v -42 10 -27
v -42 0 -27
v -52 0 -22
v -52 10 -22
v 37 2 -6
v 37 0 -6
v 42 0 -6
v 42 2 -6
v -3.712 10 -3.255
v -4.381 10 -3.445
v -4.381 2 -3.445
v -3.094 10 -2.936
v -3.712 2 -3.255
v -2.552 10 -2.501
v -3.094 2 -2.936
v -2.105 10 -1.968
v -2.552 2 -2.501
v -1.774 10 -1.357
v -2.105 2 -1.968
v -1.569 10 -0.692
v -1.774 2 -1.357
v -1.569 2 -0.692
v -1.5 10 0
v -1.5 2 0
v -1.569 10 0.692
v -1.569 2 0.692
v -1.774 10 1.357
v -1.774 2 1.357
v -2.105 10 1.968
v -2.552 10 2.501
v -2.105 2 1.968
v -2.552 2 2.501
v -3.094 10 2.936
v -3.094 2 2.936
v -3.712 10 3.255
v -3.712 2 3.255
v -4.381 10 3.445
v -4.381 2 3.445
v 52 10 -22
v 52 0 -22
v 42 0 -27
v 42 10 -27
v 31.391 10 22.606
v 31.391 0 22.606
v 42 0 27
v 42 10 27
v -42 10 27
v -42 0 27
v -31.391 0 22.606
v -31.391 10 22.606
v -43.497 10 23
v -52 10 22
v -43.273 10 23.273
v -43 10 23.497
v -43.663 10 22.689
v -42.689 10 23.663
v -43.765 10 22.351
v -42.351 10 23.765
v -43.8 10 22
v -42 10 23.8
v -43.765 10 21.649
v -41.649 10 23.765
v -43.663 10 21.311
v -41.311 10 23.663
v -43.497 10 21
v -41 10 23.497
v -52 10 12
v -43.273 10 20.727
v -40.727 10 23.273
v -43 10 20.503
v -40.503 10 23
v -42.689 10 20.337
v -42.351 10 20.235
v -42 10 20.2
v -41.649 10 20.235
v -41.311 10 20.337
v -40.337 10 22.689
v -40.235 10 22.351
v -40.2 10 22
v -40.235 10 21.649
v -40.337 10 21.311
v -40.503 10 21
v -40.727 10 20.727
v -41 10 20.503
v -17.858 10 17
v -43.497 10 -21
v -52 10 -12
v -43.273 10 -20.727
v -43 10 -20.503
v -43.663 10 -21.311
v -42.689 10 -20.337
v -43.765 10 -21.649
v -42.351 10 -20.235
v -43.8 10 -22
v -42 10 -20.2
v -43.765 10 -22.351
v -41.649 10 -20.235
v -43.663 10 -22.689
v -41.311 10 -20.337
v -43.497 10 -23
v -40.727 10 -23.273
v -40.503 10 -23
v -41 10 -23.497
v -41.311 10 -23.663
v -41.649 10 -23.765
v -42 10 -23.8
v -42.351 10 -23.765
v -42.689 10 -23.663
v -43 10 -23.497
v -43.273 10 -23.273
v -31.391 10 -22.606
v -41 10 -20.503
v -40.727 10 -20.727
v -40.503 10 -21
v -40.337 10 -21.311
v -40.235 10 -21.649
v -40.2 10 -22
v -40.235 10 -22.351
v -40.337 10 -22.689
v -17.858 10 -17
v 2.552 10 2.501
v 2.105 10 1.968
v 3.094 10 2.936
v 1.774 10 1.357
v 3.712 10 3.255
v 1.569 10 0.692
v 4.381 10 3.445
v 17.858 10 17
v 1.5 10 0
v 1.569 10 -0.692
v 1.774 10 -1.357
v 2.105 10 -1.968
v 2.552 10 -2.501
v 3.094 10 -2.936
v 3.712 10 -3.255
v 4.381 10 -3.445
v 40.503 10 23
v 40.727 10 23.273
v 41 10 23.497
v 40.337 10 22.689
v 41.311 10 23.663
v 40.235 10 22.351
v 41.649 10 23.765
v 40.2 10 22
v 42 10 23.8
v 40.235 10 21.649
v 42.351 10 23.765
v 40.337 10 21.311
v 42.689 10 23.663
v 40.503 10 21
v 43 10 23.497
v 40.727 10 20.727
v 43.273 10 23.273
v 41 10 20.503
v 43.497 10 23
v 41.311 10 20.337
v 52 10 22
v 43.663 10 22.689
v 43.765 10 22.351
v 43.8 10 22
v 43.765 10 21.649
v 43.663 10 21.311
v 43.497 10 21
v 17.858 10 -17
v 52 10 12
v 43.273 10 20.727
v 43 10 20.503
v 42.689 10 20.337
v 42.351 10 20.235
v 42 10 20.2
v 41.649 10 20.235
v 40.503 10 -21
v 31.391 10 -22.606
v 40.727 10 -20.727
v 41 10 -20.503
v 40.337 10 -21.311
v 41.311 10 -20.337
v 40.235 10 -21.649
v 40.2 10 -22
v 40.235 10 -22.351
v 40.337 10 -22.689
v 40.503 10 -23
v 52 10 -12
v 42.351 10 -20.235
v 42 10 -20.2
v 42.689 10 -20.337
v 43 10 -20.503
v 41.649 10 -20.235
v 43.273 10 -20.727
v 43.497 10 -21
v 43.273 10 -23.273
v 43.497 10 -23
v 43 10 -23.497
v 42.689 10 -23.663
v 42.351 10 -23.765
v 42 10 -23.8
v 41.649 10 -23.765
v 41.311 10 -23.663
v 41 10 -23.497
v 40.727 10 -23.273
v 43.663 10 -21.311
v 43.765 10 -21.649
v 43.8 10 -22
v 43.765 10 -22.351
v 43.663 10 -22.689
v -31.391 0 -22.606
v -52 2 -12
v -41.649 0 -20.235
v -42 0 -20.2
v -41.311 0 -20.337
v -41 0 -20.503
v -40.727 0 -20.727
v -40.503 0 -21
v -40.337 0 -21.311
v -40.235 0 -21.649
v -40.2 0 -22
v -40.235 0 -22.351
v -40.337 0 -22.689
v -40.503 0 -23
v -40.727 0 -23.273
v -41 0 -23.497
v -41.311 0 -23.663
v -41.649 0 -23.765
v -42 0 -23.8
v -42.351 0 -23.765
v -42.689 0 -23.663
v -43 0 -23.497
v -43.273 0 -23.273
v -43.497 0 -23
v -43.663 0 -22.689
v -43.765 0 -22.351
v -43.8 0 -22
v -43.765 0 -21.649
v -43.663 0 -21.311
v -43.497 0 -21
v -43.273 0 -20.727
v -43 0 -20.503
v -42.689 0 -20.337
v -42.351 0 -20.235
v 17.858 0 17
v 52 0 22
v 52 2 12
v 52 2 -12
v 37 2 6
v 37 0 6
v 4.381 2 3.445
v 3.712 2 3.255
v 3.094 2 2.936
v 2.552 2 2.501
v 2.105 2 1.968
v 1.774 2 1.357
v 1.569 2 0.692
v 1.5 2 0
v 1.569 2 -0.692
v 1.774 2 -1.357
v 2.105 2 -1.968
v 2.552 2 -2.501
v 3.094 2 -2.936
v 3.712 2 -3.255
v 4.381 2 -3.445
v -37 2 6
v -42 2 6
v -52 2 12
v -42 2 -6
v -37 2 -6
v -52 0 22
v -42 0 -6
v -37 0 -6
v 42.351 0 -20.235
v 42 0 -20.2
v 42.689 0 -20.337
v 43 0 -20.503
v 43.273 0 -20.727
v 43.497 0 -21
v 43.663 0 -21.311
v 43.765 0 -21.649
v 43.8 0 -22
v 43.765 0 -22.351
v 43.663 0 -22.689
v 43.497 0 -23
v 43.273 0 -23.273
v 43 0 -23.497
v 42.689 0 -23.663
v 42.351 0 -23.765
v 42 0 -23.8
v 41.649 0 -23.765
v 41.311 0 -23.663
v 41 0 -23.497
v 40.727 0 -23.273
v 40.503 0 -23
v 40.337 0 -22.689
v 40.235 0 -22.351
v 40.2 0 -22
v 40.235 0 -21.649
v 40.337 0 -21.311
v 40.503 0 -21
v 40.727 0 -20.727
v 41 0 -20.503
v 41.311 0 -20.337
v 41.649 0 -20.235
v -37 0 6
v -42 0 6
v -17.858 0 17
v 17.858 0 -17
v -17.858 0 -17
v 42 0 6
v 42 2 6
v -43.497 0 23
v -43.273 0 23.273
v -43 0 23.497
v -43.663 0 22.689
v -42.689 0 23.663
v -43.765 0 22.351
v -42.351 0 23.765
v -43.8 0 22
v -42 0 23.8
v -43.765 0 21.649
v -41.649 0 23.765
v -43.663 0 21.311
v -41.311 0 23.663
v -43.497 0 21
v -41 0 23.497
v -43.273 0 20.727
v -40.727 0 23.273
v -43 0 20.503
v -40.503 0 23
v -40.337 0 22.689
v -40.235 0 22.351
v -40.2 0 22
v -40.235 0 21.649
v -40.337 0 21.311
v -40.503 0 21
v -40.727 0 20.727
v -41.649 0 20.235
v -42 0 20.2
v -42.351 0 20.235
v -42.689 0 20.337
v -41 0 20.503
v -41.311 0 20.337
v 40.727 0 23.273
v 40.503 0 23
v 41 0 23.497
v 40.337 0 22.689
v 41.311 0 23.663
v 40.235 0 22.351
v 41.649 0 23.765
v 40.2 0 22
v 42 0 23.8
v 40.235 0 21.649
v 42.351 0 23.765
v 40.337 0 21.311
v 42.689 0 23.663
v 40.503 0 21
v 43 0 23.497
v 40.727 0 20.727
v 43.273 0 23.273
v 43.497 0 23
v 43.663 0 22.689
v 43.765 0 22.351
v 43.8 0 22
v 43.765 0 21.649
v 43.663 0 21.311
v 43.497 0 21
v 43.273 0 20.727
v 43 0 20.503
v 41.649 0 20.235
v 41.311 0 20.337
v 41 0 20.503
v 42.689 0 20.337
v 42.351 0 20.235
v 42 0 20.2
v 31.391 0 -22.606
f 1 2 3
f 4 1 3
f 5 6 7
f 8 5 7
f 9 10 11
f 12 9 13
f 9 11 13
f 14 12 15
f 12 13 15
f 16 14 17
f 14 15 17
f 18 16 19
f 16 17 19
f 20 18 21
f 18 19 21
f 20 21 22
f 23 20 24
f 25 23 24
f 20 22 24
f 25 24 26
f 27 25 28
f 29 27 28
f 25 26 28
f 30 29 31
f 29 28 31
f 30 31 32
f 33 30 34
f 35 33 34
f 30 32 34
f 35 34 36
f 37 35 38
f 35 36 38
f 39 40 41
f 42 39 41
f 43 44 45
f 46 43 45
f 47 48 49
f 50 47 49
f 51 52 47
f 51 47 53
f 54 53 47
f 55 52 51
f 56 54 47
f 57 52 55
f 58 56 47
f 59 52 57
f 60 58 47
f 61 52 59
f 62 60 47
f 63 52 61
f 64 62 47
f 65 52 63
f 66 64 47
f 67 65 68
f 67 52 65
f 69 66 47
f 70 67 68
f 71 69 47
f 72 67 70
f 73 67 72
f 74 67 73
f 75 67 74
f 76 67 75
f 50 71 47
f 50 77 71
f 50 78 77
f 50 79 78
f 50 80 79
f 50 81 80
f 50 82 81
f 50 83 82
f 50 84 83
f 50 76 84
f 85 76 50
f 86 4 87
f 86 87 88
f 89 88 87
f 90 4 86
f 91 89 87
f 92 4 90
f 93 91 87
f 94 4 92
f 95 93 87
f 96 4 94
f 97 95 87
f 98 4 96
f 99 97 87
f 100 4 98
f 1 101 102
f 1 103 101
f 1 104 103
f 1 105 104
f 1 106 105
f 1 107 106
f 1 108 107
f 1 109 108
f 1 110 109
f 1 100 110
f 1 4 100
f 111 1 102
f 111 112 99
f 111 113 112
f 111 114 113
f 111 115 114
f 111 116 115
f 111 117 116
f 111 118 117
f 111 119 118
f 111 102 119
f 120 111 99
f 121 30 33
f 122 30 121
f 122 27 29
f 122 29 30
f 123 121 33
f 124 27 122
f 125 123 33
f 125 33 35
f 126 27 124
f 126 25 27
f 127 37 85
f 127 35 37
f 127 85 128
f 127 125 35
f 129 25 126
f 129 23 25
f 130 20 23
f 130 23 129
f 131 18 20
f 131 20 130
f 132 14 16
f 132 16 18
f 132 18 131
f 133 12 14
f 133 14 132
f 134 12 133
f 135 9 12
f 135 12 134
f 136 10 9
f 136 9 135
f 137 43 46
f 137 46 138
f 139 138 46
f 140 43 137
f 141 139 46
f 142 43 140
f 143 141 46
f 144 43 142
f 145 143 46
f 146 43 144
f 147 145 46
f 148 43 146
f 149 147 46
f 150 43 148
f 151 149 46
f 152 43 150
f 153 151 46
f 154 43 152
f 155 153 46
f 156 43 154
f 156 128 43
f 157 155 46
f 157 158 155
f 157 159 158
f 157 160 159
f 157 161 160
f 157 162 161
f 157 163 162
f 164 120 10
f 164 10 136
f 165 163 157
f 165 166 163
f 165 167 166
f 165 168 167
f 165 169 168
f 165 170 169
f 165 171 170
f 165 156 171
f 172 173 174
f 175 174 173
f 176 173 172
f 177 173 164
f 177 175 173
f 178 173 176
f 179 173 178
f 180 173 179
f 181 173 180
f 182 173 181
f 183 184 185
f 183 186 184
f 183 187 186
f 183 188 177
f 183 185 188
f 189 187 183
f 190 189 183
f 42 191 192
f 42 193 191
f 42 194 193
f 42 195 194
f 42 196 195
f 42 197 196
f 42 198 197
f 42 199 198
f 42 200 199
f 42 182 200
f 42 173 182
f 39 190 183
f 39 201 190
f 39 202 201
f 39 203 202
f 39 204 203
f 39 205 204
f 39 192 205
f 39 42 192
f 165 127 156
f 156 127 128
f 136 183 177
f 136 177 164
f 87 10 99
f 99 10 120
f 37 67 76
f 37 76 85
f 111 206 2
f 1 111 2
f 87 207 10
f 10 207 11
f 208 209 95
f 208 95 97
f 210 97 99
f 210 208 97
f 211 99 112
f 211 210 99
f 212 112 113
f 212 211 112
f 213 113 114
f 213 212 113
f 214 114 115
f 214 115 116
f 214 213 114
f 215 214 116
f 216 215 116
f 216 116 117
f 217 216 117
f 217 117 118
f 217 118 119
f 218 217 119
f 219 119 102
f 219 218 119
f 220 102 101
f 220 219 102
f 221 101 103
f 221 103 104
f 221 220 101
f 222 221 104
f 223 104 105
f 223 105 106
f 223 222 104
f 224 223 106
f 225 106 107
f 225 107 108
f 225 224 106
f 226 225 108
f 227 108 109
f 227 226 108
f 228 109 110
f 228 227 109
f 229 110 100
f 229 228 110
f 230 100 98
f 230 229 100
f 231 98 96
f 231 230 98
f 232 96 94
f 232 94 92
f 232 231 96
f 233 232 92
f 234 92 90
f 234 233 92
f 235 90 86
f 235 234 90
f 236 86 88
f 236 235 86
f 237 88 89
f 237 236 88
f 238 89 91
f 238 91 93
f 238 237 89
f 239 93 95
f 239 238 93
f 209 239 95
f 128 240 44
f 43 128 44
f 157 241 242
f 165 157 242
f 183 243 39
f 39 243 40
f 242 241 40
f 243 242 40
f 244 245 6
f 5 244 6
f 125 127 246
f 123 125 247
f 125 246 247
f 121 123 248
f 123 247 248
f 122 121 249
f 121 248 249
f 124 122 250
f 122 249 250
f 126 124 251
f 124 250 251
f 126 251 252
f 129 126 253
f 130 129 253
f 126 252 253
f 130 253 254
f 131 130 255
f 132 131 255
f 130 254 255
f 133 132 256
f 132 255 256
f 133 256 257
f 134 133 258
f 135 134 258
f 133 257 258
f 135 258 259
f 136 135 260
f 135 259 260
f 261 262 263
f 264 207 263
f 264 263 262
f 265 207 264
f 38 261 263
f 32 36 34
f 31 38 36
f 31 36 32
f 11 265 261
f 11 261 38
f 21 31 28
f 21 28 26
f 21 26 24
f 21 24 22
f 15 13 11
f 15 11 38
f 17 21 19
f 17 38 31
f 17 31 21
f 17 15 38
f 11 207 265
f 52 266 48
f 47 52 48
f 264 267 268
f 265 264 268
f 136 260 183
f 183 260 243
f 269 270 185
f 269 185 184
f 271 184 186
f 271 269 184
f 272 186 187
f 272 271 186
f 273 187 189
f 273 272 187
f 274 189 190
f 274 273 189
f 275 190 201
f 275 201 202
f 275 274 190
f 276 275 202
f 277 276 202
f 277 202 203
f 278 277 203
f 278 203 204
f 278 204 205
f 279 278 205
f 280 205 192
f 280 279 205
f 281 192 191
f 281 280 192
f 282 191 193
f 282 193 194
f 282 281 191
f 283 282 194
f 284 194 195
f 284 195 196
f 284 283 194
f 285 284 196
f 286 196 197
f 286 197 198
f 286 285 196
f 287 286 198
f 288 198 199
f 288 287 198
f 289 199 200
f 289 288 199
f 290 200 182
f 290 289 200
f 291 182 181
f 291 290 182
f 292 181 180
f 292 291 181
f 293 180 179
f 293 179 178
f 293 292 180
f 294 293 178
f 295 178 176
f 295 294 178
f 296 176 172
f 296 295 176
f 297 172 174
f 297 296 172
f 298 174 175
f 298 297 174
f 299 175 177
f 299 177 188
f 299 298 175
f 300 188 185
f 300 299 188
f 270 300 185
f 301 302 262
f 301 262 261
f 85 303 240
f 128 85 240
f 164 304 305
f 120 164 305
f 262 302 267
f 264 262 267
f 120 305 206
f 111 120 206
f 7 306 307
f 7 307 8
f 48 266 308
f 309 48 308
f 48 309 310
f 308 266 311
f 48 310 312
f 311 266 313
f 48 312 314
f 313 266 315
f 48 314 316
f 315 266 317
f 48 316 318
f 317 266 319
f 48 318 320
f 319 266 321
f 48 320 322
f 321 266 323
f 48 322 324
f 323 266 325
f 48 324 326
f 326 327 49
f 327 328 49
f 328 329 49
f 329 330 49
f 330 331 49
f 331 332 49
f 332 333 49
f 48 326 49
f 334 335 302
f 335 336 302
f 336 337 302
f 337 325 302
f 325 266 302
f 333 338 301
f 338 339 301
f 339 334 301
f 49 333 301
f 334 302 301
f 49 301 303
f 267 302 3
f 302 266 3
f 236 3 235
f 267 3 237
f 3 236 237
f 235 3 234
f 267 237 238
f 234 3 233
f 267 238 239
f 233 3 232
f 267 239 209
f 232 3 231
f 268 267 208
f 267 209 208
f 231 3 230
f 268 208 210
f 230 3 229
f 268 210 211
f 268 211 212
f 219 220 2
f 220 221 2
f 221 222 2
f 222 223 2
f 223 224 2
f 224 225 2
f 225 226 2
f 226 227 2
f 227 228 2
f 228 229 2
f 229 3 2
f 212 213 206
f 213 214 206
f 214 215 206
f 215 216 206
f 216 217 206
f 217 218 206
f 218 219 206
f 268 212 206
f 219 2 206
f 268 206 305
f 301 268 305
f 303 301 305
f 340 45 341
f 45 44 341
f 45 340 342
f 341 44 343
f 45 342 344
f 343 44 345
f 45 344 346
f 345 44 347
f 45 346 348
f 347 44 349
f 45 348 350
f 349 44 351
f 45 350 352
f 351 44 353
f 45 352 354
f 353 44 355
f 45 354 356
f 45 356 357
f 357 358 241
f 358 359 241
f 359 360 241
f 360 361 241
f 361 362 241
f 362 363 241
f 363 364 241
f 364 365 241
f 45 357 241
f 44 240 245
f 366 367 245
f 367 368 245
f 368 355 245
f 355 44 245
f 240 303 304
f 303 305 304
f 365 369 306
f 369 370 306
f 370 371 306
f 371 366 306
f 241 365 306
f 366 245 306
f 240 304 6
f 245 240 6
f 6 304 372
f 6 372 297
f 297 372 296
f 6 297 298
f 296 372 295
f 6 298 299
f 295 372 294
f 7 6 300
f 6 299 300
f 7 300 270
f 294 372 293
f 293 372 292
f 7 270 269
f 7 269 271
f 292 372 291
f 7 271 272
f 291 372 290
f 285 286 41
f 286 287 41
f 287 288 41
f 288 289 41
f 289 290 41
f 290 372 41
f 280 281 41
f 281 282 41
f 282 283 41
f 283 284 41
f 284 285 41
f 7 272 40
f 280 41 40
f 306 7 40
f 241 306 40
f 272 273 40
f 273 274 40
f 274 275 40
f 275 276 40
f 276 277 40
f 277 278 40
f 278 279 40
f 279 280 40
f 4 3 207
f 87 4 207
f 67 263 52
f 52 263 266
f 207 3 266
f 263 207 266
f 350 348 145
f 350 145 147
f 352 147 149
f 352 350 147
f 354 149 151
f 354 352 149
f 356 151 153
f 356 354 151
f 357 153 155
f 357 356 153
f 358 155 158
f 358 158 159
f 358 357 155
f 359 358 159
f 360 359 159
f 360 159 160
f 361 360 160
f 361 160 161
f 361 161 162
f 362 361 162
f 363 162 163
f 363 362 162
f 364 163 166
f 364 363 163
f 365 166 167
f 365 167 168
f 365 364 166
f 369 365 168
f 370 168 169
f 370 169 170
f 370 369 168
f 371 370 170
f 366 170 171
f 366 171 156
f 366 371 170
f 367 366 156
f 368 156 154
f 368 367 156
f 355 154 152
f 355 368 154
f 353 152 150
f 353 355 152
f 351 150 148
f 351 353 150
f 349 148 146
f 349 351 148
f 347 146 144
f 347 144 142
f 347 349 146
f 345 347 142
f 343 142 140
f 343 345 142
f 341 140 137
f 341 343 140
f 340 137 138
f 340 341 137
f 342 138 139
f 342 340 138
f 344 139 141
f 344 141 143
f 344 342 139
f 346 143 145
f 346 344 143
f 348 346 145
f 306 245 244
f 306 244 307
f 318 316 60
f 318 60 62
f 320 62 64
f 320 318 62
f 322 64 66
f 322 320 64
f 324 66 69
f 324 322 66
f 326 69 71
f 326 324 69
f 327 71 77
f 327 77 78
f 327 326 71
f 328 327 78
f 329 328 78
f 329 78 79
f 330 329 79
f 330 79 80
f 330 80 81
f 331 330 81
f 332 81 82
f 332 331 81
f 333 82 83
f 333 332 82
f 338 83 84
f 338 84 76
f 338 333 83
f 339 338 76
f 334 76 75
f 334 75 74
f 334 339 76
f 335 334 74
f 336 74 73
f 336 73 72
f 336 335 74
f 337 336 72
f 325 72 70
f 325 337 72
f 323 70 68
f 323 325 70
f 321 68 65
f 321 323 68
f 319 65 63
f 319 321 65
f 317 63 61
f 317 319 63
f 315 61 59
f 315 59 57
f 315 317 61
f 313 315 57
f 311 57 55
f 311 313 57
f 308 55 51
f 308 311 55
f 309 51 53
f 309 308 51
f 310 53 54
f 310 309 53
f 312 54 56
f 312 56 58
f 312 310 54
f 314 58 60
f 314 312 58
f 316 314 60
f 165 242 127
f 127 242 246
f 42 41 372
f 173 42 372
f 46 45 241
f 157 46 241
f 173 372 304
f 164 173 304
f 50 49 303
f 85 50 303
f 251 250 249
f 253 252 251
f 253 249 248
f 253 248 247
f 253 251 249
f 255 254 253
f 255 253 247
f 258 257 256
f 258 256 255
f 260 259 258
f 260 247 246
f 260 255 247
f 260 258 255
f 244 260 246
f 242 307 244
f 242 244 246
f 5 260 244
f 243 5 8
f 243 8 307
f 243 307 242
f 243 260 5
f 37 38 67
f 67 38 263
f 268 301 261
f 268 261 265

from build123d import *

# Parameters (mm, degrees)
SKETCH1_R           = 1.8
BOSS_EXTRUDE1_DEPTH = 10
SKETCH1_3_W         = 5
SKETCH1_3_H         = 12
BOSS_EXTRUDE2_DEPTH = 2


with BuildPart() as part:
    # Sketch1 → Boss-Extrude1 (new body)
    with BuildSketch(Plane(origin=(0, 0, 0), x_dir=(1, 0, 0), z_dir=(0, 1, 0))):
        with BuildLine():
            Line((-42, -27), (-17.857864376, -17))
            Line((-17.857864376, -17), (17.857864376, -17))
            Line((17.857864376, -17), (42, -27))
            Line((42, -27), (52, -22))
            Line((52, -22), (52, -12))
            Line((52, -12), (4.381103052, -3.444846378))
            ThreePointArc((4.381103052, -3.444846378), (1.5, 0), (4.381103052, 3.444846378))
            Line((4.381103052, 3.444846378), (52, 12))
            Line((52, 12), (52, 22))
            Line((52, 22), (42, 27))
            Line((42, 27), (17.857864376, 17))
            Line((17.857864376, 17), (-17.857864376, 17))
            Line((-17.857864376, 17), (-42, 27))
            Line((-42, 27), (-52, 22))
            Line((-52, 22), (-52, 12))
            Line((-52, 12), (-4.381103052, 3.444846378))
            ThreePointArc((-4.381103052, 3.444846378), (-1.5, 0), (-4.381103052, -3.444846378))
            Line((-4.381103052, -3.444846378), (-52, -12))
            Line((-52, -12), (-52, -22))
            Line((-52, -22), (-42, -27))
        make_face()
        with Locations((-42, -22)):
            Circle(SKETCH1_R, mode=Mode.SUBTRACT)
        with Locations((-42, 22)):
            Circle(SKETCH1_R, mode=Mode.SUBTRACT)
        with Locations((42, 22)):
            Circle(SKETCH1_R, mode=Mode.SUBTRACT)
        with Locations((42, -22)):
            Circle(SKETCH1_R, mode=Mode.SUBTRACT)
    extrude(amount=BOSS_EXTRUDE1_DEPTH)

    # Sketch1<3> → Boss-Extrude2 (add)
    # profile 1 of 2: a face of its own
    with BuildSketch(Plane(origin=(0, 0, 0), x_dir=(1, 0, 0), z_dir=(0, 1, 0))):
        with BuildLine():
            Line((-52, 12), (-52, -12))
            Line((-52, -12), (-4.381103052, -3.444846378))
            ThreePointArc((-4.381103052, -3.444846378), (-1.5, 0), (-4.381103052, 3.444846378))
            Line((-4.381103052, 3.444846378), (-52, 12))
        make_face()
        with Locations((-39.5, 0)):
            Rectangle(SKETCH1_3_W, SKETCH1_3_H, mode=Mode.SUBTRACT)
    # profile 2 of 2: a face of its own
    with BuildSketch(Plane(origin=(0, 0, 0), x_dir=(1, 0, 0), z_dir=(0, 1, 0))):
        with BuildLine():
            Line((4.381103052, -3.444846378), (52, -12))
            Line((52, -12), (52, 12))
            Line((52, 12), (4.381103052, 3.444846378))
            ThreePointArc((4.381103052, 3.444846378), (1.5, 0), (4.381103052, -3.444846378))
        make_face()
        with Locations((39.5, 0)):
            Rectangle(SKETCH1_3_W, SKETCH1_3_H, mode=Mode.SUBTRACT)
    extrude(amount=BOSS_EXTRUDE2_DEPTH)


solid = part.part
